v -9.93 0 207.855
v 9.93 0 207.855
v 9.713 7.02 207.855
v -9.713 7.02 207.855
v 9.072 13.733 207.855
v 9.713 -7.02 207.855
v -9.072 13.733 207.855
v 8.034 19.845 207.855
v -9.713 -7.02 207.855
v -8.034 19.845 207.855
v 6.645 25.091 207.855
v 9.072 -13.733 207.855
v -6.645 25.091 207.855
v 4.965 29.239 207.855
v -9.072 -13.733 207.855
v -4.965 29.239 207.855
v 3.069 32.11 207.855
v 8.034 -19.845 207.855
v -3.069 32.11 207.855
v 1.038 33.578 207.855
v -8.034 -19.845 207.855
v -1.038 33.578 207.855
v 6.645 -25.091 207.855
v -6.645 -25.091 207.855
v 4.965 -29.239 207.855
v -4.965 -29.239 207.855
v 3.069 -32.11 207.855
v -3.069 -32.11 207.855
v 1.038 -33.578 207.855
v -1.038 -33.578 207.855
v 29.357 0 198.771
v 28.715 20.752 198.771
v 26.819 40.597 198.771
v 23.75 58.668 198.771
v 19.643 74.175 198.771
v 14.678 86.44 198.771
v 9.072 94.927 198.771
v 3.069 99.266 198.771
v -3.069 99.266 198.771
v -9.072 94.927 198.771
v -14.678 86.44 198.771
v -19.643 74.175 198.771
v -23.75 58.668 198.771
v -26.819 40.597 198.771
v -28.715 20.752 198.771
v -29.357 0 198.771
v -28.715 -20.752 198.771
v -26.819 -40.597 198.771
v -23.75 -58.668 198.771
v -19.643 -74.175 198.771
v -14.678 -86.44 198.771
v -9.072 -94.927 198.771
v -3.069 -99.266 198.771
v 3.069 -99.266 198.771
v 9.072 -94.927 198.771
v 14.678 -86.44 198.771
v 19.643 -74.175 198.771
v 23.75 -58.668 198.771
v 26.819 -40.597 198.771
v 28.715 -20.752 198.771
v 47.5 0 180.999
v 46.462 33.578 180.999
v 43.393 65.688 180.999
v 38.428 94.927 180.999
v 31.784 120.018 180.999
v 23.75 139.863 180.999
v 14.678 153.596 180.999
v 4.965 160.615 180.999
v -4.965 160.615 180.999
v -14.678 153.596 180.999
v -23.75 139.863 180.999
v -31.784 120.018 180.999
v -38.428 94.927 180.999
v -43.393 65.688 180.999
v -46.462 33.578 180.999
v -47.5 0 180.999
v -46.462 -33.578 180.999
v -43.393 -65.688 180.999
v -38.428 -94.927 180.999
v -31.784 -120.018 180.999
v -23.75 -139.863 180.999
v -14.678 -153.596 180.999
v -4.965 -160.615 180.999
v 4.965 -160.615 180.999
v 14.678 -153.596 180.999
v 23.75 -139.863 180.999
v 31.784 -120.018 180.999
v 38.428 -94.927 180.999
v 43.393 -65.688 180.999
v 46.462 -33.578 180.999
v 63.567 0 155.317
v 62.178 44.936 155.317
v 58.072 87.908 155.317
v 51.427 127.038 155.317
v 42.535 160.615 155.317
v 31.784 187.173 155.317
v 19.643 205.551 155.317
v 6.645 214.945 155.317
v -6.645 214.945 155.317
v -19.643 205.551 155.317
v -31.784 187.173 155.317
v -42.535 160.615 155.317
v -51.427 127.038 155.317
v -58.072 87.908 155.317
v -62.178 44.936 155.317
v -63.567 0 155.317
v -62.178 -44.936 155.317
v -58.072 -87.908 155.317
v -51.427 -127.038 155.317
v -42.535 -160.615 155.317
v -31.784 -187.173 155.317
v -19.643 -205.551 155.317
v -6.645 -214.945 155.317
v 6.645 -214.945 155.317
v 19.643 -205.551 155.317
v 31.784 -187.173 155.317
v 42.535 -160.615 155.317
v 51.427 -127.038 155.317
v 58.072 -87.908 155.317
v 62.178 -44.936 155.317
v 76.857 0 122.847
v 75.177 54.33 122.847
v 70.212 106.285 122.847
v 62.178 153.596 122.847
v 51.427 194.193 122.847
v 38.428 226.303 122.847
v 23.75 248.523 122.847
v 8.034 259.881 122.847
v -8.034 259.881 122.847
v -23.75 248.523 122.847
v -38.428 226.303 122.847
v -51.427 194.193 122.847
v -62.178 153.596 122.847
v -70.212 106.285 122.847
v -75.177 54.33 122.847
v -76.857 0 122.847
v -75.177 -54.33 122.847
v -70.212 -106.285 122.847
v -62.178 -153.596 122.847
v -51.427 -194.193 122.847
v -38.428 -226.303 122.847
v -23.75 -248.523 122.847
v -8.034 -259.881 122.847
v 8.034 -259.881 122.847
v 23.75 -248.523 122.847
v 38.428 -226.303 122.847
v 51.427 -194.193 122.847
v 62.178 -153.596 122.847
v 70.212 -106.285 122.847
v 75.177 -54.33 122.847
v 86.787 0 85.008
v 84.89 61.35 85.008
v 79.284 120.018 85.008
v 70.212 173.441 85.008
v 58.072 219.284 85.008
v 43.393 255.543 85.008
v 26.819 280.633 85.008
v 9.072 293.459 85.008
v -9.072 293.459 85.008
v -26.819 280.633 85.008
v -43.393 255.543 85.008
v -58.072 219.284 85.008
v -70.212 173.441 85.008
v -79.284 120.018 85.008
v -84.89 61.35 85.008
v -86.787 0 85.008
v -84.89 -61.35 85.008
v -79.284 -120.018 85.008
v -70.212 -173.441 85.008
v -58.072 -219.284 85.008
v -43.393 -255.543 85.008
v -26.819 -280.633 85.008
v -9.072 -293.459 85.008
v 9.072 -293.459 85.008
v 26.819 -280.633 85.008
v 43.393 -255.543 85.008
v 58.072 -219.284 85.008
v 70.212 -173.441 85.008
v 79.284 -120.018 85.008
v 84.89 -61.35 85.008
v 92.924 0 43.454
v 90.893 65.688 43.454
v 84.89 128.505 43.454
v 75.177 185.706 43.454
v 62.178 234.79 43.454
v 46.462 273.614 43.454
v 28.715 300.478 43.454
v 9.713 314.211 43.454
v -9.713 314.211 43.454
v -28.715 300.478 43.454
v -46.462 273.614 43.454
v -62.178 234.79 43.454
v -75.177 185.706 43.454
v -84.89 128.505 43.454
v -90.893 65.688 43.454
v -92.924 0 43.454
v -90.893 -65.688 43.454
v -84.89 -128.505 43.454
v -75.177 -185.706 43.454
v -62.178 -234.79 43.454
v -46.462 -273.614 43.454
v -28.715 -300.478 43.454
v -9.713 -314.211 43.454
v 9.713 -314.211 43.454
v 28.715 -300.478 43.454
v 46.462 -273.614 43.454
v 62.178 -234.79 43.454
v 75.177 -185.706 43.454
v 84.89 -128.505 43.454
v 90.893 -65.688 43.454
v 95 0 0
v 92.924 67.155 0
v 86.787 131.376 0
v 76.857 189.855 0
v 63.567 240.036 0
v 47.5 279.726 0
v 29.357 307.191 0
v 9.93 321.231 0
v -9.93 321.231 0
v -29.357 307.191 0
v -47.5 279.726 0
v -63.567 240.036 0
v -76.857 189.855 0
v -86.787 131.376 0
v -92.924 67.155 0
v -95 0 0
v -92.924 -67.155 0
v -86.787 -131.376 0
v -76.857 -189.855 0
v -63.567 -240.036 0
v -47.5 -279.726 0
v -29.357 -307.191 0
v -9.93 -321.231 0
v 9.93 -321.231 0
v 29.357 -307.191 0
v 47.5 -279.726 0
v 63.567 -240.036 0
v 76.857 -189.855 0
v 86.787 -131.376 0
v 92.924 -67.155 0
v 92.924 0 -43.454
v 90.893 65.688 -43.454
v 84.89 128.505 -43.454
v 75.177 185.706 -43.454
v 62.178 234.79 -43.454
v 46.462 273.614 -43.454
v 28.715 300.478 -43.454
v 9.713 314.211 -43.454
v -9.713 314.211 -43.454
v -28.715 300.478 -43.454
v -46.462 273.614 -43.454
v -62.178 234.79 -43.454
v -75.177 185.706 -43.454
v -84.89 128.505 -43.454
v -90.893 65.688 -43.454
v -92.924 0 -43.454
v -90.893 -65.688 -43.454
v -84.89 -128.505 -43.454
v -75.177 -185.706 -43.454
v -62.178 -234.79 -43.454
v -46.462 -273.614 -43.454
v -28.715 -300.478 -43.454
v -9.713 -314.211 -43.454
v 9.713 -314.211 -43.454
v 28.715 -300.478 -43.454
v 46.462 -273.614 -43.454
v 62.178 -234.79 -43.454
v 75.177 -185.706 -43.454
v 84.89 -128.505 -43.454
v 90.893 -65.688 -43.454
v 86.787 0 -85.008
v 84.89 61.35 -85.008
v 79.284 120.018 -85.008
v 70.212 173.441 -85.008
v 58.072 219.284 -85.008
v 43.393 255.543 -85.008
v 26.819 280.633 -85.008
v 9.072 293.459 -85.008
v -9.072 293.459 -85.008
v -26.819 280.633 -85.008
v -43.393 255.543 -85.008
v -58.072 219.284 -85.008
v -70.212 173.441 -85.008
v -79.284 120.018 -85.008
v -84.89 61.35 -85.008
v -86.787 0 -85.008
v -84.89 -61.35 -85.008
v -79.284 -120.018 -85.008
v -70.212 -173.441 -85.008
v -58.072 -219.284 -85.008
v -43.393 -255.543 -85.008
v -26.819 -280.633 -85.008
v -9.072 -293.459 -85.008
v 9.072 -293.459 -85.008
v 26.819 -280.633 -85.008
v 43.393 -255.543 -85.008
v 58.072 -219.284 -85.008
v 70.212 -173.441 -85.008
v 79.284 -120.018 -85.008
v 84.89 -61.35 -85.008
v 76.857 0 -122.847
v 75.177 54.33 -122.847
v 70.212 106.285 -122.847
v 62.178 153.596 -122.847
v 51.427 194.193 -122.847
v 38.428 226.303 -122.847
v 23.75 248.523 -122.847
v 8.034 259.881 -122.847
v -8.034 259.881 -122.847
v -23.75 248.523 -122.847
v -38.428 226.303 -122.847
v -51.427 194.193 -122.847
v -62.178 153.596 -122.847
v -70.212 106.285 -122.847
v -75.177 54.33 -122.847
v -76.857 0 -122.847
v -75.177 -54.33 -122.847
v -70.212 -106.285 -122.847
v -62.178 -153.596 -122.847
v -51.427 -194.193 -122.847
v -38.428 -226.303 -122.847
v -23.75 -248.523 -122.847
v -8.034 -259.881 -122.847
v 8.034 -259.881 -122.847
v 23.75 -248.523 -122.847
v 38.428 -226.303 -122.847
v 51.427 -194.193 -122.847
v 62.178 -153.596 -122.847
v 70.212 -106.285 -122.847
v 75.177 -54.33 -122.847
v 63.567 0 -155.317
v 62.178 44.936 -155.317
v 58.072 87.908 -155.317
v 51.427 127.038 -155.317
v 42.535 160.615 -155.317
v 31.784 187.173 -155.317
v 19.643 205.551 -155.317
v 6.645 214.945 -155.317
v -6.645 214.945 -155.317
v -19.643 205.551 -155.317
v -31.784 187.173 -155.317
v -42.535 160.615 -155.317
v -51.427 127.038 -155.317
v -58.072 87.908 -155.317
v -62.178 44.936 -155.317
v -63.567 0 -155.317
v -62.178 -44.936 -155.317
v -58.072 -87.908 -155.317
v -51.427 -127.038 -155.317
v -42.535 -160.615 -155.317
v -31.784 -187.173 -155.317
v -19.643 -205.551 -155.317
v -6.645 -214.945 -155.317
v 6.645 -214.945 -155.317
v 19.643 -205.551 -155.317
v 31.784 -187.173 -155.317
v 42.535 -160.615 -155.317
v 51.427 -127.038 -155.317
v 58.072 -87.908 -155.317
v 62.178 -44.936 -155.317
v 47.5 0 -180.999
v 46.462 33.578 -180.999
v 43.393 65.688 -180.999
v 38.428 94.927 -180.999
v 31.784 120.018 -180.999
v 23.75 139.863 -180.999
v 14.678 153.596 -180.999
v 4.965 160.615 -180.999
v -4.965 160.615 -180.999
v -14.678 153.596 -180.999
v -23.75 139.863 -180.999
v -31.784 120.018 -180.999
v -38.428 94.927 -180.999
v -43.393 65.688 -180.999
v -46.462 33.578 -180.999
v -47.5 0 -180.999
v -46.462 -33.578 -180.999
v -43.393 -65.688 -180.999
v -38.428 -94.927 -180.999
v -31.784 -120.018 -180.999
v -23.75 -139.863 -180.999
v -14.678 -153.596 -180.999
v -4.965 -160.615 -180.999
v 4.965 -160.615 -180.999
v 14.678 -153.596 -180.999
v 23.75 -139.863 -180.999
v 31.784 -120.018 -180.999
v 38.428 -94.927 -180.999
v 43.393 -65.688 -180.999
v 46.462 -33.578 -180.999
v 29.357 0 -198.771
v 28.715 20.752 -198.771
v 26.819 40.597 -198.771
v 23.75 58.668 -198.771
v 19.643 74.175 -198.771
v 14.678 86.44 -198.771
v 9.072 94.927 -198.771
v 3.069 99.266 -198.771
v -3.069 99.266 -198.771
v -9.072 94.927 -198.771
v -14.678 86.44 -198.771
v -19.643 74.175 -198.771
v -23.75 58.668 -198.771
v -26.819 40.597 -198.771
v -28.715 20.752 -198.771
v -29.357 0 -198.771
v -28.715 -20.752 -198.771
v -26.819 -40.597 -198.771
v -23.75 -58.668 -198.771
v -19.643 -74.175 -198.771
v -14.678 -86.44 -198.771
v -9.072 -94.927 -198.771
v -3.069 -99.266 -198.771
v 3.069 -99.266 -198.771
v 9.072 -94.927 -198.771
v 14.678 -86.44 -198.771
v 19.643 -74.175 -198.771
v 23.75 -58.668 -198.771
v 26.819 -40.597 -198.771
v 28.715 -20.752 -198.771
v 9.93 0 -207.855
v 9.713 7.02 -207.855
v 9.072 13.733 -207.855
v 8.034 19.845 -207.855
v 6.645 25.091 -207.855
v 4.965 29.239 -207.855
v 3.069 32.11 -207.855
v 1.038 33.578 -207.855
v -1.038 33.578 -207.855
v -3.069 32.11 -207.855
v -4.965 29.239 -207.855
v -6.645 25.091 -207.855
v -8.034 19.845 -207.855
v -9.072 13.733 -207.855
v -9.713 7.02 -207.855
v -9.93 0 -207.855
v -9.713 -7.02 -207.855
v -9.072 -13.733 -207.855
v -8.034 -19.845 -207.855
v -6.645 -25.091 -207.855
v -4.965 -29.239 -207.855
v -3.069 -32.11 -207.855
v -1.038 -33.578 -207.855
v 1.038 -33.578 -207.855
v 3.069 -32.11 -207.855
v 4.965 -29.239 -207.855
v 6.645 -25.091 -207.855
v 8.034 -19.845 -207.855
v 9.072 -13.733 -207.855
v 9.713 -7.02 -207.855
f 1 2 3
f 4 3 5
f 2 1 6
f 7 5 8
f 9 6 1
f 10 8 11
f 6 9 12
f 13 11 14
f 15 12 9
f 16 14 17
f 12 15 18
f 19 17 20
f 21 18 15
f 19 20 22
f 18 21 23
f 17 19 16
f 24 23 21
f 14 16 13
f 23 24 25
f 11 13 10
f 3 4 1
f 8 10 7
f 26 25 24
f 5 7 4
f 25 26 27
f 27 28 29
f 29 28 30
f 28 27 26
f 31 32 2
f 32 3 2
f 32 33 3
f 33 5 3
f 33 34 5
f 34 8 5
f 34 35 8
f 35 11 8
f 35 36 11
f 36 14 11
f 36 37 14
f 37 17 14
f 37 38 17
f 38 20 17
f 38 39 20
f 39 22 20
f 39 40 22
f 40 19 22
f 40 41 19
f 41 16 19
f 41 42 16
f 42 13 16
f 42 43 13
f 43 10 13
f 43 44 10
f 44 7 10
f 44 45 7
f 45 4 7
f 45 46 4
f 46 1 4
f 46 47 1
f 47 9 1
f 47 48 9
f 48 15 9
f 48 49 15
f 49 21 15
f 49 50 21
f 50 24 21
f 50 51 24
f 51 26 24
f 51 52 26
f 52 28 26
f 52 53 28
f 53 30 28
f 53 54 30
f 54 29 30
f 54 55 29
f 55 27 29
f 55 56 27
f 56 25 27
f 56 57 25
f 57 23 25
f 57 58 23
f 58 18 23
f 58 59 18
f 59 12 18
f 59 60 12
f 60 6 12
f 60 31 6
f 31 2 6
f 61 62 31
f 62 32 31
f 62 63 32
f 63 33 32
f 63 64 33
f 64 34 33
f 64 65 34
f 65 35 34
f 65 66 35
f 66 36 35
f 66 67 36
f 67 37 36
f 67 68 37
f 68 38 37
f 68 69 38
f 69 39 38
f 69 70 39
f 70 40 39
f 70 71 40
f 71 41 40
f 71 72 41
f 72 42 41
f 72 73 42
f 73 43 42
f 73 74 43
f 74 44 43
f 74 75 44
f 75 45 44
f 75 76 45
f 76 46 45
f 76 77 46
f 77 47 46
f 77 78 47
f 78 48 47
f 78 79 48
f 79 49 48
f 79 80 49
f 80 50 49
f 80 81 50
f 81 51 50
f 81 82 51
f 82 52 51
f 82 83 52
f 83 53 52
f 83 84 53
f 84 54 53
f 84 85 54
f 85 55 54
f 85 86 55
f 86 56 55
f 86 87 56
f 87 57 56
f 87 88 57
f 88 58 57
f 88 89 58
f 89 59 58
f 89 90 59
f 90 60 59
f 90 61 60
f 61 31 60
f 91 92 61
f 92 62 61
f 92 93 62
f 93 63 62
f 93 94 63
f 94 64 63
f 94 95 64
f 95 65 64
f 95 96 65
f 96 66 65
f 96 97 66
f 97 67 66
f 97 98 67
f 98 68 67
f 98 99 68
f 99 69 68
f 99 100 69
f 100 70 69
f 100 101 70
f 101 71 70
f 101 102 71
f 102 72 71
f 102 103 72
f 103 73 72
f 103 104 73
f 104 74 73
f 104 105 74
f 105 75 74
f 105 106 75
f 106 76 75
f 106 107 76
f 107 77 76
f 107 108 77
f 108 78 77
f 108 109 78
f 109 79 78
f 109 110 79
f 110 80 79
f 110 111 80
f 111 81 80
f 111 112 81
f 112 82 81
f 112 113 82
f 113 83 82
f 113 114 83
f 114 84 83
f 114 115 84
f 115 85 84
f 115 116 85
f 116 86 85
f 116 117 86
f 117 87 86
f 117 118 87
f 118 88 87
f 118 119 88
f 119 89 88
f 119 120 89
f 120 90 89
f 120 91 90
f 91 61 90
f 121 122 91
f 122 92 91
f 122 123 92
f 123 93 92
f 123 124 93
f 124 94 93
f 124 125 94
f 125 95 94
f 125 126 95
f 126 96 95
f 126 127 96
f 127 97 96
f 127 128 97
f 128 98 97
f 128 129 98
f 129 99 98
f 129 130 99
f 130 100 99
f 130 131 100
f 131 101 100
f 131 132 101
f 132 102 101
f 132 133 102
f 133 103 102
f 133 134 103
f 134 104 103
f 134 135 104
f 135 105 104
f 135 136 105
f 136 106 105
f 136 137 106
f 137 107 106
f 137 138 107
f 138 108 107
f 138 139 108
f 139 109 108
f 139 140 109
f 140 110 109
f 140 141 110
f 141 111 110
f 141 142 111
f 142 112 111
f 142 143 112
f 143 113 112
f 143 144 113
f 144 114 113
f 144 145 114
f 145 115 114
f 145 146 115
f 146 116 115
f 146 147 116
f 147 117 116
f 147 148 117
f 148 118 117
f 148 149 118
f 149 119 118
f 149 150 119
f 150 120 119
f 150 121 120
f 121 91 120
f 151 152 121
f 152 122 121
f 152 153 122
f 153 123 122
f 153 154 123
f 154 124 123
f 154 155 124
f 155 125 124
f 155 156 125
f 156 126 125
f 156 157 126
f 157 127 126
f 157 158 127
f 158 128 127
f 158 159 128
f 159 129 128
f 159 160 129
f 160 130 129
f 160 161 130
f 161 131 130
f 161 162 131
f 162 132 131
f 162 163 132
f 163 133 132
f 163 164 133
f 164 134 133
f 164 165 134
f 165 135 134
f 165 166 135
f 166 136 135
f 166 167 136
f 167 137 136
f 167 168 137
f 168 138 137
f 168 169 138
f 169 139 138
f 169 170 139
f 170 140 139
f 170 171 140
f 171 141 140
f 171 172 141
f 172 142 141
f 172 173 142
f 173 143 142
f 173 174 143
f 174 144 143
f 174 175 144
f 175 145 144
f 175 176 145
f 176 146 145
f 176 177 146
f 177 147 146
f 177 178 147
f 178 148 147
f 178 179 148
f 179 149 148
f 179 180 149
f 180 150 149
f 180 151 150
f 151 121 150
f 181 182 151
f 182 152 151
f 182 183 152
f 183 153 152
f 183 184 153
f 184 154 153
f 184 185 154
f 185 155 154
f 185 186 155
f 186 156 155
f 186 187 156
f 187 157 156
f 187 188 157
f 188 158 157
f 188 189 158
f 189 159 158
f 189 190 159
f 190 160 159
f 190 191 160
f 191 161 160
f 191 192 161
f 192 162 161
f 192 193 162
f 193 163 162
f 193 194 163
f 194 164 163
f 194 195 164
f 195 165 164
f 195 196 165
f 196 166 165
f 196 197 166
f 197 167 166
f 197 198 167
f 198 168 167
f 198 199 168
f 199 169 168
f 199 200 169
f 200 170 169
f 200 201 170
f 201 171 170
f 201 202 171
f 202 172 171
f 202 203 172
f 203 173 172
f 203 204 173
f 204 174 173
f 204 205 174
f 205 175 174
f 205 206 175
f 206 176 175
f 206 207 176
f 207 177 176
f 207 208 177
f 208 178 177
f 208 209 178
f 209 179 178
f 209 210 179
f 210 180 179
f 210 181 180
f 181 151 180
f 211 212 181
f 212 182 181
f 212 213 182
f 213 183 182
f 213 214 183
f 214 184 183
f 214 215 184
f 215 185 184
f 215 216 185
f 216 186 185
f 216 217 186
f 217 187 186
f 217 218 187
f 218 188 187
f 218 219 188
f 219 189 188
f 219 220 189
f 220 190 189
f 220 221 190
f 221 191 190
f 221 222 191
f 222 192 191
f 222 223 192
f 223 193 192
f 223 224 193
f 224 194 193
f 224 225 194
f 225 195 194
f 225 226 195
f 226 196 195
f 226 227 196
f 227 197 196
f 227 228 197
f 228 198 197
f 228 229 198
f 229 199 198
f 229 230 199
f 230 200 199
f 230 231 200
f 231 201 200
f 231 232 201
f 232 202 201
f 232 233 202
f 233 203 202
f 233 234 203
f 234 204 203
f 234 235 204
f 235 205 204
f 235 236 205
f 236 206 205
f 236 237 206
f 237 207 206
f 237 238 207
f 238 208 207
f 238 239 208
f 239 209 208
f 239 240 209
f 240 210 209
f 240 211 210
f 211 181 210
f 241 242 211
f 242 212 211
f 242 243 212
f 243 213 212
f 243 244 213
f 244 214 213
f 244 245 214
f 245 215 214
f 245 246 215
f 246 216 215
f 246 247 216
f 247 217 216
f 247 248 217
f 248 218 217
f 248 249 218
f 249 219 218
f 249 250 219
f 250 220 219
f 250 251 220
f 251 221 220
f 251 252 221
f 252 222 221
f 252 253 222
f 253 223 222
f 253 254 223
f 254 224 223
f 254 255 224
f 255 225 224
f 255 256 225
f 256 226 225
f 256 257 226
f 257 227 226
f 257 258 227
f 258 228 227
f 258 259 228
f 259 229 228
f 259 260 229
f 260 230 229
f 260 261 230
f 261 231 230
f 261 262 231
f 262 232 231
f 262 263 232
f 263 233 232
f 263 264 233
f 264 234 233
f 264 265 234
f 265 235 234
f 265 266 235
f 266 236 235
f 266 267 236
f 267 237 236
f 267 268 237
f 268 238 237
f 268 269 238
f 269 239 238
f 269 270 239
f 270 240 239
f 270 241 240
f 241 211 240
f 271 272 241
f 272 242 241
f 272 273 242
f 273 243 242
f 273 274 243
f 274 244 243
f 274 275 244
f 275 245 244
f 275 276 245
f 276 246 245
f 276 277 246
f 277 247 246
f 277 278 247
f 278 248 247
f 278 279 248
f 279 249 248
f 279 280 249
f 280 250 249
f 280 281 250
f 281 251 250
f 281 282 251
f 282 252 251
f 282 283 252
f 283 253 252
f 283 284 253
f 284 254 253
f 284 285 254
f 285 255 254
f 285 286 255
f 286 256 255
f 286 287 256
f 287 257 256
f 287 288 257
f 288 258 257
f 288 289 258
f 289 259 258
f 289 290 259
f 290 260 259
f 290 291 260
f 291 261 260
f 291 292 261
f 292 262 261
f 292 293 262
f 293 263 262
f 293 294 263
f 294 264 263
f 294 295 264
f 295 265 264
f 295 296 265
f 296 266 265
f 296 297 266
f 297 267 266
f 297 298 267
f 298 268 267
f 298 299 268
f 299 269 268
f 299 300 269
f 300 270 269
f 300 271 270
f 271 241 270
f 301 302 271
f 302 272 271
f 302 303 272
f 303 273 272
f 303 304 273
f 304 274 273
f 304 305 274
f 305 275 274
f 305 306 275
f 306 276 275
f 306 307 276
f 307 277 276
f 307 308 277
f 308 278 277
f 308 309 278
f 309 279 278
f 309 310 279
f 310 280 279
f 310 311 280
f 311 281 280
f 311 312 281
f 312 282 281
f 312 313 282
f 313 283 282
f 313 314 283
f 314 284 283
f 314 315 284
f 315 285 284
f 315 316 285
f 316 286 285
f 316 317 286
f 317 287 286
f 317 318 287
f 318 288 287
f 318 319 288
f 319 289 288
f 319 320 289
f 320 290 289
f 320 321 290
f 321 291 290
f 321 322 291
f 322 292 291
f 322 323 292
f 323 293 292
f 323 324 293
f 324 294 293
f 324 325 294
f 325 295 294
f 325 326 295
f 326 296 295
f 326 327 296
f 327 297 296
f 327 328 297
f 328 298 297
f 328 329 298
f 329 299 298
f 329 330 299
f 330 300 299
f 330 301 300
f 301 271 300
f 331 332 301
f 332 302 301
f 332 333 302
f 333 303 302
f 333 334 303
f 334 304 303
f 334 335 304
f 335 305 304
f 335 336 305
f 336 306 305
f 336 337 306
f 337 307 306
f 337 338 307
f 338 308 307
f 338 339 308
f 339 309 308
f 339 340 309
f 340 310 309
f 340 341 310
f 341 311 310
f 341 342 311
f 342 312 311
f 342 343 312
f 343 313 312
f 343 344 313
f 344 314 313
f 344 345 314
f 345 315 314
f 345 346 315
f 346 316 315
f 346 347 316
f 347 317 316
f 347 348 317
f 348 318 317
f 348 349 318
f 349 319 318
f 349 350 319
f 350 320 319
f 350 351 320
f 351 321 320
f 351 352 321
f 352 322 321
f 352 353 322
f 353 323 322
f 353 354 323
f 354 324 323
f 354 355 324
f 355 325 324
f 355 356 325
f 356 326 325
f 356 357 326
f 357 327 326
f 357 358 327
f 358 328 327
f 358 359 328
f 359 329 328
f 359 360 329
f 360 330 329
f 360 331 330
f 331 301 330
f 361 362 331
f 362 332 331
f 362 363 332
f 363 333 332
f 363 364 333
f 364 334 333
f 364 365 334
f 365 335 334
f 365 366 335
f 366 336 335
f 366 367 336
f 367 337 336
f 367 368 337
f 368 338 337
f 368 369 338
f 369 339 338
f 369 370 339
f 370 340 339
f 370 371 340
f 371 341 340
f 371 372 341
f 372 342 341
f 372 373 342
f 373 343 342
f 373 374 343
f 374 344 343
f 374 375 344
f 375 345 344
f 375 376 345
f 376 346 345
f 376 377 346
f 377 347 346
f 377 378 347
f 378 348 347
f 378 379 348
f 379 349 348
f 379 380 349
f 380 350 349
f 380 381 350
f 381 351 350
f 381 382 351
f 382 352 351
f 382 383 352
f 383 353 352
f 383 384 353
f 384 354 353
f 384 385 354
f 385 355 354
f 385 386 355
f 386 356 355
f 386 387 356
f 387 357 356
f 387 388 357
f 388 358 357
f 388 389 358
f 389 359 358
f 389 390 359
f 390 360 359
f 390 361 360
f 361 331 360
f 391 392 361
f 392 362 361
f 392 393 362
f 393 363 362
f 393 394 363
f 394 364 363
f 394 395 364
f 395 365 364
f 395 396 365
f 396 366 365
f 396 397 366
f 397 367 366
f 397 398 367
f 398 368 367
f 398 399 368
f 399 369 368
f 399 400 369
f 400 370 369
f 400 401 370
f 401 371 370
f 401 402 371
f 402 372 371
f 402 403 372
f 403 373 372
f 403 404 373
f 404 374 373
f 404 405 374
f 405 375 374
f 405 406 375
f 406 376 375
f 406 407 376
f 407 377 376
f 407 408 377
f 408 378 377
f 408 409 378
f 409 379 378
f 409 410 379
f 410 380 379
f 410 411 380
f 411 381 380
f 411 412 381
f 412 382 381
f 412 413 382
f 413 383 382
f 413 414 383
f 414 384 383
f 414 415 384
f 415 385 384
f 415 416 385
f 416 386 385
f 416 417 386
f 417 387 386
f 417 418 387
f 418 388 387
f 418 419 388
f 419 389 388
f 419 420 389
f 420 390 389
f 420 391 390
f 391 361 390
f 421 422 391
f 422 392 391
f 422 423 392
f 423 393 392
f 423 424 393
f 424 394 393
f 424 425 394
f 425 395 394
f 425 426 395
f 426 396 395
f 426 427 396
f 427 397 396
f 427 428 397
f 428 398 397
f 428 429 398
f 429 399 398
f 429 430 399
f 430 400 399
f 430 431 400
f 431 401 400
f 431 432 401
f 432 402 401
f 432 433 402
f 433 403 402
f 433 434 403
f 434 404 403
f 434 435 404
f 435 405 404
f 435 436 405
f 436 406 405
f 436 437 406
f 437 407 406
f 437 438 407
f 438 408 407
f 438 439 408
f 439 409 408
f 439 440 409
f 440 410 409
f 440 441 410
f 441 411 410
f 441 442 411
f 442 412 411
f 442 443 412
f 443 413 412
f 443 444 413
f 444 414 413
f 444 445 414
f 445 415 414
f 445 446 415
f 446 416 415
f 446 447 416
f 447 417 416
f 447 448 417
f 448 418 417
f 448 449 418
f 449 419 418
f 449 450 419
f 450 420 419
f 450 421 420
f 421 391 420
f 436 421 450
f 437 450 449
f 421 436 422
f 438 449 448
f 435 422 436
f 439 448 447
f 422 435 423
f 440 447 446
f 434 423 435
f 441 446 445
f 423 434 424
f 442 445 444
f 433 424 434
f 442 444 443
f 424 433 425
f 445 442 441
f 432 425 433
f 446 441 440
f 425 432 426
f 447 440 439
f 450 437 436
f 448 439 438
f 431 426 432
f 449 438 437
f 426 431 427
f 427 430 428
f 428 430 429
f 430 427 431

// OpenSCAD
// Generated by SolidPython 1.0.1 on 2020-07-29 00:46:47


scale(v = [5, 17, 11]) {
	sphere(r = 19);
}
/***********************************************
*********      SolidPython code:      **********
************************************************
 
# import packages: SolidPython
from solid import *
from solid.utils import *
from itertools import chain, combinations, permutations


class Resize:

    def __init__(self, scad_file):
        self.scad_file = scad_file
        #self.scad_file = import_scad(scad_file)
        # cone/cylinder param:
        self.r1 = 0
        self.r2 = 0
        self.h = 0
        # rectangular prism param:
        self.w = 0
        self.l = 0
        # ellipse param:
        self.r = 0

    # import OpenScad code (file name corresponds to shape)


    # classify shape + parameters
    def assign(self, param1, param2, param3):
        if self.scad_file == 'cone.scad':
            self.r1 = param1
            self.r2 = param2
            self.h = param3
        elif self.scad_file == 'cylinder.scad':
            self.r1 = param1
            self.r2 = param2
            self.h = param3
        elif self.scad_file == 'rectangularPrism.scad':
            self.h = param1
            self.l = param2
            self.w = param3
        else:
            self.r = param1
            self.h = param2

    # resize parameters
    def iterate(self):
        x = range(3, 20, 2)
        i = 1
        if self.scad_file == 'cone.scad':
            tempList = list(permutations(x, 2))
            for temp in tempList:
                param1 = temp[0]
                param2 = temp[1]
                filepath = 'produced_scad_files/' + 'cone' + str(param1) + '_' + str(param2) + '_' + '.scad'
                scad_render_to_file(cylinder(h=param1, r1=param2, r2=0), filepath)

        elif self.scad_file == 'cylinder.scad':
            tempList = list(permutations(x, 3))
            for temp in tempList:
                param1 = temp[0]
                param2 = temp[1]
                filepath = 'produced_scad_files/' + 'cylinder' + str(param1) + '_' + str(param2) + '_' + '.scad'
                scad_render_to_file(cylinder(h=param1, r1=param2, r2=param2), filepath)

        elif self.scad_file == 'rectangularPrism.scad':
            tempList = list(permutations(x, 3))
            for temp in tempList:
                param1 = temp[0]
                param2 = temp[1]
                param3 = temp[2]
                filepath = 'produced_scad_files/' + 'rectangularPrism' + str(param1) + '_' + str(param2) + '_' + str(
                    param3) + '.scad'
                scad_render_to_file(cube(size=(param1, param2, param3)), filepath)

        elif self.scad_file == 'ellipse.scad':
            tempList = list(permutations(x, 4))
            for temp in tempList:
                param1 = temp[0]
                param2 = temp[1]
                param3 = temp[2]
                param4 = temp[3]
                filepath = 'produced_scad_files/' + 'ellipse' + str(param1) + '_' + str(param2) + '_' + str(param3) + '_' + str(param4) + '.scad'
                scad_render_to_file(scale([param1, param2, param3])(sphere(r=param4)), filepath)

    def render_to_scadfile(self):
        scad_render_to_file(scad, 'example.scad') 
 
************************************************/
